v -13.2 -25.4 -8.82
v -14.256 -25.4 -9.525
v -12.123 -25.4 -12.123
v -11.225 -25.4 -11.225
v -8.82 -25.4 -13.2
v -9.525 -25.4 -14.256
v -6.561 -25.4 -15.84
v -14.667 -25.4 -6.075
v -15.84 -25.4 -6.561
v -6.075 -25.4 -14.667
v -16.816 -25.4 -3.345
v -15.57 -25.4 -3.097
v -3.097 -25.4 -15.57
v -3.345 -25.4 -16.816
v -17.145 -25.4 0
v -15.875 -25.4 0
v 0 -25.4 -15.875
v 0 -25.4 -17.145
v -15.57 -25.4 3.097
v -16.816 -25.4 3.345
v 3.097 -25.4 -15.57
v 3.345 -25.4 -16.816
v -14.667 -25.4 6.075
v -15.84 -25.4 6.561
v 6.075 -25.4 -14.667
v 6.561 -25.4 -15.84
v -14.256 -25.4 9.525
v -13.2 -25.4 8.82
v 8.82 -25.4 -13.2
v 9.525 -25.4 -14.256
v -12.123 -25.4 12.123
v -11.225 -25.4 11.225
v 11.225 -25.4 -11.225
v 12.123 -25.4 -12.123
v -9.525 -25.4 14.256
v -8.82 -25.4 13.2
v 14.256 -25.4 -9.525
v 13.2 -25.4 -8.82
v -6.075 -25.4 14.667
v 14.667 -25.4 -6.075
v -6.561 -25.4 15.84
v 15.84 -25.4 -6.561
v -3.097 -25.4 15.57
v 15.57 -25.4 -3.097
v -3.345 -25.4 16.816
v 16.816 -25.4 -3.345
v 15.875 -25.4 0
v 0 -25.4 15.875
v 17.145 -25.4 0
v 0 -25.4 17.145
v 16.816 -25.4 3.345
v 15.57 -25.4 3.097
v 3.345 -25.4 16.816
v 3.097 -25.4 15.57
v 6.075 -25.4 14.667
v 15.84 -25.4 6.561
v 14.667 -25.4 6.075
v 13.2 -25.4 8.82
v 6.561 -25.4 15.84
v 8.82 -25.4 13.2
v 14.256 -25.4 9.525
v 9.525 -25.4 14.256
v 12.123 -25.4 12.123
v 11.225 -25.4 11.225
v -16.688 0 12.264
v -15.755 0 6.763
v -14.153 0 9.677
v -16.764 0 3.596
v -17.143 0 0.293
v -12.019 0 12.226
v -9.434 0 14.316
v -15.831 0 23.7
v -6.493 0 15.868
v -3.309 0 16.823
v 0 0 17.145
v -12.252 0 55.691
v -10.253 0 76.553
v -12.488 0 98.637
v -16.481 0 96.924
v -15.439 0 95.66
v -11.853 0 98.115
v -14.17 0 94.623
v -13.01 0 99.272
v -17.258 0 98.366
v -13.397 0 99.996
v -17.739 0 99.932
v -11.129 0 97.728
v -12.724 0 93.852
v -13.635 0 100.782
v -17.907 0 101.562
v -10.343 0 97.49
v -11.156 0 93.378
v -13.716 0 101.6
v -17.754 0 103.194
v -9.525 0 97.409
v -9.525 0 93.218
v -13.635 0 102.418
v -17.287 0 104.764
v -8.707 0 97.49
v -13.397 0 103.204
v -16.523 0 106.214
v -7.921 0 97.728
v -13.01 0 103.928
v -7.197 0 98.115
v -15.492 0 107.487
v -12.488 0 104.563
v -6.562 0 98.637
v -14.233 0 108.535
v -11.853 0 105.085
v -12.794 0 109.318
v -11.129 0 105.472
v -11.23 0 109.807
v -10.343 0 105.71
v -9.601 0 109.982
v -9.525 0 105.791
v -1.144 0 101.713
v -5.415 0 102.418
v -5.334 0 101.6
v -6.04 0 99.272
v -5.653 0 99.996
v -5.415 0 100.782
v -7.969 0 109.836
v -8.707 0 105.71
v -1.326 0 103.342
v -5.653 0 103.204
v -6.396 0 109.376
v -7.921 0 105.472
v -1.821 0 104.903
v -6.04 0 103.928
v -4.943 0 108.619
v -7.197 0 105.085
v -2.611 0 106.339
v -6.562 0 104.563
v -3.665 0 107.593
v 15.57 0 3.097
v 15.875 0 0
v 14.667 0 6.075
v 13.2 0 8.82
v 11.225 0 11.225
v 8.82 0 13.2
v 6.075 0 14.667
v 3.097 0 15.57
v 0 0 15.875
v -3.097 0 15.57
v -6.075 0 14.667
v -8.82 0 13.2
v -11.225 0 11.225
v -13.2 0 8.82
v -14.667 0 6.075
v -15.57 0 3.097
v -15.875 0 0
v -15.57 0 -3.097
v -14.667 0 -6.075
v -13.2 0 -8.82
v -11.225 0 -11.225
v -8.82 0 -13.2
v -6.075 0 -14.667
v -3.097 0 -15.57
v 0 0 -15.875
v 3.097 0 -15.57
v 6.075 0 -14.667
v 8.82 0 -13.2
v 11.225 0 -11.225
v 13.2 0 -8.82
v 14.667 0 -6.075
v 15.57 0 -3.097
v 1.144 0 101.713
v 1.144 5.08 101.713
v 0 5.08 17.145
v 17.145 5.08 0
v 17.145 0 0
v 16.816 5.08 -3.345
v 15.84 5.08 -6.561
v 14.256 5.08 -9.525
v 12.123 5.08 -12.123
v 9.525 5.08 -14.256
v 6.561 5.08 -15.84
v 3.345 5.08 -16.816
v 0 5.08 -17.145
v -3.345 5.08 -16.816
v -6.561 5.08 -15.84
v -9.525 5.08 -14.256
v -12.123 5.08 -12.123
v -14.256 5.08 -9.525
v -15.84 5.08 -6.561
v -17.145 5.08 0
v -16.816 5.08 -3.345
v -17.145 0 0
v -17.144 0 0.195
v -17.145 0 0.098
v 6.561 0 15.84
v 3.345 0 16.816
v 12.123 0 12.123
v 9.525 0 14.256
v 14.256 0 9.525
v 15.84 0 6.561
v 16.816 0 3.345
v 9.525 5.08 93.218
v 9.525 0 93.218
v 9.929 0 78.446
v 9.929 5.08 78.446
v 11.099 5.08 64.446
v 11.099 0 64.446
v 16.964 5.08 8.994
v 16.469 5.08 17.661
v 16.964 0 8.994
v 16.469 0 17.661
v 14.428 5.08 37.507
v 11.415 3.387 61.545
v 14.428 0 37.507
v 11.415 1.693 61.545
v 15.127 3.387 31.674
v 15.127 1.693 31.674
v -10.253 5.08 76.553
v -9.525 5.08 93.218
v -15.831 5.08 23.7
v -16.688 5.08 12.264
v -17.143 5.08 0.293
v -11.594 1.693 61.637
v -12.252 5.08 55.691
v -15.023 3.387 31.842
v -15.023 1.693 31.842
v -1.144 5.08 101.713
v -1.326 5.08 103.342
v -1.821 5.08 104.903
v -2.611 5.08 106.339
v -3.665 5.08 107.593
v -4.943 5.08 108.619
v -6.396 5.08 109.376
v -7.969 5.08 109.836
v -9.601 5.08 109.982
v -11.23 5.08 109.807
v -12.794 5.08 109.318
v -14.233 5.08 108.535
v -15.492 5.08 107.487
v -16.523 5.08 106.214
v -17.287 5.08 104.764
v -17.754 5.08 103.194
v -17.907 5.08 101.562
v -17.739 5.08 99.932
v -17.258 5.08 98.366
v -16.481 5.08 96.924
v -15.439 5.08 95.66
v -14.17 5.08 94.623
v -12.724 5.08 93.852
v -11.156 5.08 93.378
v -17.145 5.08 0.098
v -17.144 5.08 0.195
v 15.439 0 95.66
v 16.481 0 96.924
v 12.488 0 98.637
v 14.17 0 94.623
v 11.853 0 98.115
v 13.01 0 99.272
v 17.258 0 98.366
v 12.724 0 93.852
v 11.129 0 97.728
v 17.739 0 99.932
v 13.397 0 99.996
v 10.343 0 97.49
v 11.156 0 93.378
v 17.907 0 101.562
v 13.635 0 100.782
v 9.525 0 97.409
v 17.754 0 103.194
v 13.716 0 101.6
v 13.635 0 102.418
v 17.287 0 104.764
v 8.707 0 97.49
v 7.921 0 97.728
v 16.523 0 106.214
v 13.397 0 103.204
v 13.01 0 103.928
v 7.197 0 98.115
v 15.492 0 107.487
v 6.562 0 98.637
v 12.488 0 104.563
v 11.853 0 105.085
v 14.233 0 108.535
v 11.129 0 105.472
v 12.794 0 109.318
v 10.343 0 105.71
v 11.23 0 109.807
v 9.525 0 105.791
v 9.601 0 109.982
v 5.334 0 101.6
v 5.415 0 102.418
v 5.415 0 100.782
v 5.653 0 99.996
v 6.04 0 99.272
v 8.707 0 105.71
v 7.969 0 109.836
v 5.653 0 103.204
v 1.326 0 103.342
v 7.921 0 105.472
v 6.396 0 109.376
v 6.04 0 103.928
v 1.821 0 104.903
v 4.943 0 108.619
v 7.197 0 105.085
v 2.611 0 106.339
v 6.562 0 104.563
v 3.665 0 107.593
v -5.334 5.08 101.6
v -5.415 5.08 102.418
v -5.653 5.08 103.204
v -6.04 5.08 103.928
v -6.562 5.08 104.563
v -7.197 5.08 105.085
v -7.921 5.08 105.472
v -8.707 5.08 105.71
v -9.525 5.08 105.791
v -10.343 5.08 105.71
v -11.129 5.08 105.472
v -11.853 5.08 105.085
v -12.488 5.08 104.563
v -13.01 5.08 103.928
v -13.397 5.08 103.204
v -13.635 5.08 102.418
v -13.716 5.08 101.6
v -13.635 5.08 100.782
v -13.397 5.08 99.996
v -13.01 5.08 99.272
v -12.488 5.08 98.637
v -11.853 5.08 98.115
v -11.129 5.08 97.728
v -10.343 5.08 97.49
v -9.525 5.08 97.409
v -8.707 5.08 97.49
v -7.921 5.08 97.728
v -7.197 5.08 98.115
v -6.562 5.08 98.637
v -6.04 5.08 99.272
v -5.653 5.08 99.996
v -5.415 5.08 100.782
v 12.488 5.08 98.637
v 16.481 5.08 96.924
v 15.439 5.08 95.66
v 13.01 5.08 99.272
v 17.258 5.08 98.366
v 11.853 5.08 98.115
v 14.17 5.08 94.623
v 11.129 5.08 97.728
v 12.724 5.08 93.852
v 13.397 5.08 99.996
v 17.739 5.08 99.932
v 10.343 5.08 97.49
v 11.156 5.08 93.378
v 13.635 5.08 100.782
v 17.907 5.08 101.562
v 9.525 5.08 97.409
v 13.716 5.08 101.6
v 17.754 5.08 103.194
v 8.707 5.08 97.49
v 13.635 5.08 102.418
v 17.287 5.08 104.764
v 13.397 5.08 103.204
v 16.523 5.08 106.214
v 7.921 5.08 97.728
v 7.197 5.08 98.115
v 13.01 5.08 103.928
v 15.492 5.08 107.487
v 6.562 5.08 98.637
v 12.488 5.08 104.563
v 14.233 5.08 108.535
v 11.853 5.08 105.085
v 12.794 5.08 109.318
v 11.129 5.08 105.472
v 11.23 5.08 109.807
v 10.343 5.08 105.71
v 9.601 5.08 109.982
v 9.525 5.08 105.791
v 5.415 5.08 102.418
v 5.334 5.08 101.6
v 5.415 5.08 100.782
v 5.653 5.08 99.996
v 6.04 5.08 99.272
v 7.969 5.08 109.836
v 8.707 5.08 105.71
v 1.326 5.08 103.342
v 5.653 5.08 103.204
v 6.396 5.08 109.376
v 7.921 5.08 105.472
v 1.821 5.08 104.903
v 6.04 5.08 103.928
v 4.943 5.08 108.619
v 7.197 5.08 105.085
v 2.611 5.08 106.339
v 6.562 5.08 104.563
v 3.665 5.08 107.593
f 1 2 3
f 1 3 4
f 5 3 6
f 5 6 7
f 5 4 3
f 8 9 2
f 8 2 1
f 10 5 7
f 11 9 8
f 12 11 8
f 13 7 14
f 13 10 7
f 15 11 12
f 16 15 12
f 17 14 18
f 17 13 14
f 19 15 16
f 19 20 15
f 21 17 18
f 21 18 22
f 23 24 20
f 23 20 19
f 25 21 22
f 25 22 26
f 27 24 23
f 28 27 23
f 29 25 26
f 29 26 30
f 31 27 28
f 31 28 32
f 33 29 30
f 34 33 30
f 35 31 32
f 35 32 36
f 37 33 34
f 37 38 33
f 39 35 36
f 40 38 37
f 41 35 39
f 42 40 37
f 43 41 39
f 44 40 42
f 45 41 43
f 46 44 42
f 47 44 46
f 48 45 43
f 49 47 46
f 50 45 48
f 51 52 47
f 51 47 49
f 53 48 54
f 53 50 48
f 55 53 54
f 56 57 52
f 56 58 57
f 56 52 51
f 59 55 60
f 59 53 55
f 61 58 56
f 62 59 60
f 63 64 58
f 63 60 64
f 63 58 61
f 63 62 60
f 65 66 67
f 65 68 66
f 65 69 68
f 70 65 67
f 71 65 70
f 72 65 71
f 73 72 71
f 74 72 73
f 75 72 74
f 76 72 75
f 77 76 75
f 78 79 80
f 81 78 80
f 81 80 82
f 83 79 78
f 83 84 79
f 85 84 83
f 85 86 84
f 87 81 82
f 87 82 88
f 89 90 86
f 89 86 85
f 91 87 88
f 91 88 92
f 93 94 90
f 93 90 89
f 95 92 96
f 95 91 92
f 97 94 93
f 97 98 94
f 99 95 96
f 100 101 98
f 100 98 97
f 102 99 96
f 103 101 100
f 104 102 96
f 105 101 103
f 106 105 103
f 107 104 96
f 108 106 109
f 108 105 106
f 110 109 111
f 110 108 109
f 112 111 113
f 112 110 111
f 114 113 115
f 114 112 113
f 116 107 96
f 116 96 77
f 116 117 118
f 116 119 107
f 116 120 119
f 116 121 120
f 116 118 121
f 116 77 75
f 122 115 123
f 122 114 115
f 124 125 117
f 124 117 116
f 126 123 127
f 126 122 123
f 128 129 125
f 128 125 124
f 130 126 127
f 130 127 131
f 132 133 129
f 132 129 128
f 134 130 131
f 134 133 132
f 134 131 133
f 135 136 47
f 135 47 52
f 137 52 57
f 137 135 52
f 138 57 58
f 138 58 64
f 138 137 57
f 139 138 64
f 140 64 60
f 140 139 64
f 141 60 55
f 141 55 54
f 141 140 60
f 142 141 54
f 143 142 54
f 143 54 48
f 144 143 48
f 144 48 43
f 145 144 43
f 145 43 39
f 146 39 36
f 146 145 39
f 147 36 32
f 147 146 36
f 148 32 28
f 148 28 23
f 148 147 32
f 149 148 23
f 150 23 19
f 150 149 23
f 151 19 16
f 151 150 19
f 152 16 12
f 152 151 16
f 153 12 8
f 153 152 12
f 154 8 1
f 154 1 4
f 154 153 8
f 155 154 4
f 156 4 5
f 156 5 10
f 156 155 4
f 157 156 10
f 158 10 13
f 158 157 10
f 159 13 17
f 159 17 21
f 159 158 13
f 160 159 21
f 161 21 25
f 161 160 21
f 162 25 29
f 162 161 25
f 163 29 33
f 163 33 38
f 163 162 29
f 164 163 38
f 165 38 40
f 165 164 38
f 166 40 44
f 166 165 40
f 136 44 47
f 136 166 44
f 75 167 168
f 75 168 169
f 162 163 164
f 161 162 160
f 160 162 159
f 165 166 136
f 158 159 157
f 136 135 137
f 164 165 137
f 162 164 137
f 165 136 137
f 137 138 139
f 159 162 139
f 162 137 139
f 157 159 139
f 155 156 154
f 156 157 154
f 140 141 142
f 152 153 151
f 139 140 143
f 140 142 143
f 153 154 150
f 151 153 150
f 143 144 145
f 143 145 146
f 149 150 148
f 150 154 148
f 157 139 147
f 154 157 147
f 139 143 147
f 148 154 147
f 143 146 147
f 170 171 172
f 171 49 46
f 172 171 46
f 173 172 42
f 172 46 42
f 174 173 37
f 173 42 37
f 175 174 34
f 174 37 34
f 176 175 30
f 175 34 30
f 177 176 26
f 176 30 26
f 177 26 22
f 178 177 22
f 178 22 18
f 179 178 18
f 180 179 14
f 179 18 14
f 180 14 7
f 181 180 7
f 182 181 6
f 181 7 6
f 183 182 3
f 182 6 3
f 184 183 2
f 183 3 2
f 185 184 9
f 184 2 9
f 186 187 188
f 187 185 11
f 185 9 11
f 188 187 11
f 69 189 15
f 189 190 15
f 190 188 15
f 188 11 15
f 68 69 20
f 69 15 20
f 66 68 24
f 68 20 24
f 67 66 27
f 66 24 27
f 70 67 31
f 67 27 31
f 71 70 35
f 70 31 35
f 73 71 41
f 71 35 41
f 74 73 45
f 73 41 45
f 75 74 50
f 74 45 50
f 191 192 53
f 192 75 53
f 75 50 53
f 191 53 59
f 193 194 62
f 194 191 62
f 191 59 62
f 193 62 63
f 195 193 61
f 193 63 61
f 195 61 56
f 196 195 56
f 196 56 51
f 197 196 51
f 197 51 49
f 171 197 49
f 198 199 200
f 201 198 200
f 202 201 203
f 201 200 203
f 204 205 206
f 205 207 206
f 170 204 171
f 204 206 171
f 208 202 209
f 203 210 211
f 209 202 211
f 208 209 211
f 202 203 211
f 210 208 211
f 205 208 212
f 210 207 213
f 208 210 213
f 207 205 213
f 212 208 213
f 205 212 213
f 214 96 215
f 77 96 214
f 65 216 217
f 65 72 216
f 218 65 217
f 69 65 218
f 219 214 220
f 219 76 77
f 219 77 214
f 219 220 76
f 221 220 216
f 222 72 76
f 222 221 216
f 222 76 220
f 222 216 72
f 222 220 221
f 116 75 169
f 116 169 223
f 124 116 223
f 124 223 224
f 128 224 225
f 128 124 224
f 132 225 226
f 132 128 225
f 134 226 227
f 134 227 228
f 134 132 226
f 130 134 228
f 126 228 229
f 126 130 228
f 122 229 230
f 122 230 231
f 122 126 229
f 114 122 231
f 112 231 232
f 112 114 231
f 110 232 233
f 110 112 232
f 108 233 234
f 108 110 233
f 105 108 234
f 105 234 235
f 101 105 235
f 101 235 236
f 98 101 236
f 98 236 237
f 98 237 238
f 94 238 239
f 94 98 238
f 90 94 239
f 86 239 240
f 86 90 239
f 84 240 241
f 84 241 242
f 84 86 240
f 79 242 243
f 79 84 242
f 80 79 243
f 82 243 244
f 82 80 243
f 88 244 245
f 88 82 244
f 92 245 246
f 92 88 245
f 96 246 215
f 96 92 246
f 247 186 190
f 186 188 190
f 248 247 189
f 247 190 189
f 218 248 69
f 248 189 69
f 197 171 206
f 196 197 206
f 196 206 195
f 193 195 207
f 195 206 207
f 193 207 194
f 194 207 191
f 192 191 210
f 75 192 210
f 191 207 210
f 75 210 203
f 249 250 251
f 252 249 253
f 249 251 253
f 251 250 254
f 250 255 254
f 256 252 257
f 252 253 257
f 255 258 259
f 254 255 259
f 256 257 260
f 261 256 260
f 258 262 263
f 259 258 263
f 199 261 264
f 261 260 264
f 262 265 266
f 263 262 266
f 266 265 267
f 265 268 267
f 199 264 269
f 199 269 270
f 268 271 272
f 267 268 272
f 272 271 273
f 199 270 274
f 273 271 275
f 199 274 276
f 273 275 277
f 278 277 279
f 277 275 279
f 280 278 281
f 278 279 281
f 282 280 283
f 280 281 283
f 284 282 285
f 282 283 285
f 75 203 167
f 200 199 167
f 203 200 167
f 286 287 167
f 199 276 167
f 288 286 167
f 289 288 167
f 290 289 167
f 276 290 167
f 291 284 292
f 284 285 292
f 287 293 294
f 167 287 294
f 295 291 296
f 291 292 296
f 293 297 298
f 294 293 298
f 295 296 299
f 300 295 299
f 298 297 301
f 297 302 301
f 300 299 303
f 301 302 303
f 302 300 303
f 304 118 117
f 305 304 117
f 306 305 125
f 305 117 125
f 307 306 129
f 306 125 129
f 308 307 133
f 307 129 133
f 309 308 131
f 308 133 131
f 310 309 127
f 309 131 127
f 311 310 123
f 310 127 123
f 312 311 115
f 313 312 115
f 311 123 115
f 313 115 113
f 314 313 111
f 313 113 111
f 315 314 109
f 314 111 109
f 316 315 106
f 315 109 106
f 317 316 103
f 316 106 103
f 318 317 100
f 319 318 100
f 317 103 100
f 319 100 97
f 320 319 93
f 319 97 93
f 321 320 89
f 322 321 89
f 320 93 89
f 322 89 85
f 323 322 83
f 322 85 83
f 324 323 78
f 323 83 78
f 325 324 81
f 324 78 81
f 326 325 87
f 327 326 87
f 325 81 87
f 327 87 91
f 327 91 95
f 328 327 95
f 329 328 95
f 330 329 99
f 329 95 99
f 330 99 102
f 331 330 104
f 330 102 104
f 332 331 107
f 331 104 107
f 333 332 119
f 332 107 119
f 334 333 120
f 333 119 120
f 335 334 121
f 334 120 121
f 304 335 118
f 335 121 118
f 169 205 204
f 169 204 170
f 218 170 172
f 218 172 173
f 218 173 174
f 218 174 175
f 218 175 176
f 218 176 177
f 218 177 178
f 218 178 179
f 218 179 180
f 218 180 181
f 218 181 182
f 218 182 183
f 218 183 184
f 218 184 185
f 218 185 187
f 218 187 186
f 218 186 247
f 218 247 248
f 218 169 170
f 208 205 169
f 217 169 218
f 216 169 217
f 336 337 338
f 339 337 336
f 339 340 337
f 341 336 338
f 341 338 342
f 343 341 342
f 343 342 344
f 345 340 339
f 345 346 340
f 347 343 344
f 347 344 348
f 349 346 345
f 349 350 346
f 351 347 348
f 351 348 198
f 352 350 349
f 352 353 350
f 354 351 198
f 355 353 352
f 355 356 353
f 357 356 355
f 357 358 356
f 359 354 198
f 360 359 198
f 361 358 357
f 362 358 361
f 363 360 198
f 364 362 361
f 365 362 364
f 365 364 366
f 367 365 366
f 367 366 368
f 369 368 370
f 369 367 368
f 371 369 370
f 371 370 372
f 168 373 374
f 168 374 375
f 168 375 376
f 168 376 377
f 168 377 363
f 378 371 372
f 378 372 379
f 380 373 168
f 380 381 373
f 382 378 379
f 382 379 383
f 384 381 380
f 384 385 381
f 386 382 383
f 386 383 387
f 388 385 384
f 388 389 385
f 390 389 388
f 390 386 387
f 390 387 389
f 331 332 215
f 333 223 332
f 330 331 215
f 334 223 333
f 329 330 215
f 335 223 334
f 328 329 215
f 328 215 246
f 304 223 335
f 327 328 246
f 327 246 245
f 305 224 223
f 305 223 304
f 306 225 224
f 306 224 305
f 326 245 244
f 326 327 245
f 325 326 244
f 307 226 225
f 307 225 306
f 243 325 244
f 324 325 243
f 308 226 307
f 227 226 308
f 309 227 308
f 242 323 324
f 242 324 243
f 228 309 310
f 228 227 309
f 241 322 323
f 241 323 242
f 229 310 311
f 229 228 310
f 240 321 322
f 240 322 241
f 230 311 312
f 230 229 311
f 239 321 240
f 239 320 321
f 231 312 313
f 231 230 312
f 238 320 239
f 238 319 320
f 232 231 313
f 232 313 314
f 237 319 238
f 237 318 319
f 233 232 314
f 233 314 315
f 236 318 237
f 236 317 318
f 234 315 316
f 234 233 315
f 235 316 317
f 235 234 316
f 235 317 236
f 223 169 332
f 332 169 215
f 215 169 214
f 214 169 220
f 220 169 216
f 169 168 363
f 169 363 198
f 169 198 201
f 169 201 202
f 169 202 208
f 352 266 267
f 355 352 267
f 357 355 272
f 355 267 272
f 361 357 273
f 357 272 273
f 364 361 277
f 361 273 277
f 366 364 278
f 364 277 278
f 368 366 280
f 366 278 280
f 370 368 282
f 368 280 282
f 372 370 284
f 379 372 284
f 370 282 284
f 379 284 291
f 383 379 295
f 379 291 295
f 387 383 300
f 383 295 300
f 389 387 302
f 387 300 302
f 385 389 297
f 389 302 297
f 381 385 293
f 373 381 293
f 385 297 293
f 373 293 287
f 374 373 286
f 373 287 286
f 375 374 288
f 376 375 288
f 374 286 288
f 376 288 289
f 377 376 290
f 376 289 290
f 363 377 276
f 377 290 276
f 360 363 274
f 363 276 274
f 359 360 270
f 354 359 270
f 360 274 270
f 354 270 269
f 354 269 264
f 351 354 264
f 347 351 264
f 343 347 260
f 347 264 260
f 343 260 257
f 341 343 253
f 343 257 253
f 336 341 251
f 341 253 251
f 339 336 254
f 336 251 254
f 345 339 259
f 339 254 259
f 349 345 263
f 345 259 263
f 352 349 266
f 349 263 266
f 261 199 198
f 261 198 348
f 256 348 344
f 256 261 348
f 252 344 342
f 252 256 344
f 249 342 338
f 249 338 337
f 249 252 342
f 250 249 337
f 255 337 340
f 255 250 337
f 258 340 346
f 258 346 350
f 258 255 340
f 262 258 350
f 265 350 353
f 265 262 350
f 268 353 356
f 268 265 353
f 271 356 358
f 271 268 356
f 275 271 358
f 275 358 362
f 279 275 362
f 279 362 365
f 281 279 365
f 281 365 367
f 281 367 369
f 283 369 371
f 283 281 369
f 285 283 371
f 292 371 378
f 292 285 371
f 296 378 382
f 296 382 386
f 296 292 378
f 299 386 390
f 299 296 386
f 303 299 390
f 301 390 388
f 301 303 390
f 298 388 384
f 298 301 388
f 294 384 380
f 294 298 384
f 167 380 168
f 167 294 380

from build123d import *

# Parameters (mm, degrees)
F0_R     = 17.145
F0_R_2   = 15.875
F1_DEPTH = 25.4
F2_R     = 17.145
F3_DEPTH = 5.08
F4_R     = 4.191
F5_DEPTH = 5.08


# Not quite as in the source:
# - after a boolean that leaves OpenCascade's solid faulty, fix() repairs it


with BuildPart() as f1:
    # F0 (on Front) → F1 (new body)
    with BuildSketch(Plane.XZ):
        Circle(F0_R)
        Circle(F0_R_2, mode=Mode.SUBTRACT)
    extrude(amount=F1_DEPTH)

    # F2 (on face) → F3 (join)
    with BuildSketch(Plane(origin=(0, 0, 0), x_dir=(-1, 0, 0), z_dir=(0, 1, 0))):
        Circle(F2_R)
    extrude(amount=F3_DEPTH)

    # F4 (on face) → F5 (join, through all)
    with BuildSketch(Plane.XZ):
        with BuildLine():
            add(Edge.make_bspline(
                [(9.525, 93.218), (9.3322422676, 59.4415284404), (17.145, 33.7770215762), (17.145, 0)],
                knots=[0, 0, 0, 0, 93.5289256006, 93.5289256006, 93.5289256006, 93.5289256006], degree=3))
            ThreePointArc((9.525, 93.218), (15.4919111989, 107.486755876), (1.1437665087, 101.7133541532))
            Line((1.1437665087, 101.7133541532), (0, 17.145))
            ThreePointArc((0, 17.145), (12.1233457634, 12.1233457634), (17.145, 0))
        make_face()
        with Locations((9.525, 101.6)):
            Circle(F4_R, mode=Mode.SUBTRACT)
        with BuildLine():
            ThreePointArc((-17.1425003406, 0.2927577006), (-12.0193946233, 12.2264131244), (0, 17.145))
            Line((0, 17.145), (-1.1437665087, 101.7133541532))
            ThreePointArc((-1.1437665087, 101.7133541532), (-15.4919111989, 107.486755876), (-9.525, 93.218))
            add(Edge.make_bspline(
                [(-9.525, 93.218), (-10.0234570054, 59.5641158888), (-16.5685631435, 33.8997937459), (-17.1425003406, 0.2927577006)],
                knots=[0, 0, 0, 0, 93.2585047549, 93.2585047549, 93.2585047549, 93.2585047549], degree=3))
        make_face()
        with Locations((-9.525, 101.6)):
            Circle(F4_R, mode=Mode.SUBTRACT)
    extrude(amount=-F5_DEPTH)

    add(f1.part.fix(), mode=Mode.REPLACE)


solid = f1.part
